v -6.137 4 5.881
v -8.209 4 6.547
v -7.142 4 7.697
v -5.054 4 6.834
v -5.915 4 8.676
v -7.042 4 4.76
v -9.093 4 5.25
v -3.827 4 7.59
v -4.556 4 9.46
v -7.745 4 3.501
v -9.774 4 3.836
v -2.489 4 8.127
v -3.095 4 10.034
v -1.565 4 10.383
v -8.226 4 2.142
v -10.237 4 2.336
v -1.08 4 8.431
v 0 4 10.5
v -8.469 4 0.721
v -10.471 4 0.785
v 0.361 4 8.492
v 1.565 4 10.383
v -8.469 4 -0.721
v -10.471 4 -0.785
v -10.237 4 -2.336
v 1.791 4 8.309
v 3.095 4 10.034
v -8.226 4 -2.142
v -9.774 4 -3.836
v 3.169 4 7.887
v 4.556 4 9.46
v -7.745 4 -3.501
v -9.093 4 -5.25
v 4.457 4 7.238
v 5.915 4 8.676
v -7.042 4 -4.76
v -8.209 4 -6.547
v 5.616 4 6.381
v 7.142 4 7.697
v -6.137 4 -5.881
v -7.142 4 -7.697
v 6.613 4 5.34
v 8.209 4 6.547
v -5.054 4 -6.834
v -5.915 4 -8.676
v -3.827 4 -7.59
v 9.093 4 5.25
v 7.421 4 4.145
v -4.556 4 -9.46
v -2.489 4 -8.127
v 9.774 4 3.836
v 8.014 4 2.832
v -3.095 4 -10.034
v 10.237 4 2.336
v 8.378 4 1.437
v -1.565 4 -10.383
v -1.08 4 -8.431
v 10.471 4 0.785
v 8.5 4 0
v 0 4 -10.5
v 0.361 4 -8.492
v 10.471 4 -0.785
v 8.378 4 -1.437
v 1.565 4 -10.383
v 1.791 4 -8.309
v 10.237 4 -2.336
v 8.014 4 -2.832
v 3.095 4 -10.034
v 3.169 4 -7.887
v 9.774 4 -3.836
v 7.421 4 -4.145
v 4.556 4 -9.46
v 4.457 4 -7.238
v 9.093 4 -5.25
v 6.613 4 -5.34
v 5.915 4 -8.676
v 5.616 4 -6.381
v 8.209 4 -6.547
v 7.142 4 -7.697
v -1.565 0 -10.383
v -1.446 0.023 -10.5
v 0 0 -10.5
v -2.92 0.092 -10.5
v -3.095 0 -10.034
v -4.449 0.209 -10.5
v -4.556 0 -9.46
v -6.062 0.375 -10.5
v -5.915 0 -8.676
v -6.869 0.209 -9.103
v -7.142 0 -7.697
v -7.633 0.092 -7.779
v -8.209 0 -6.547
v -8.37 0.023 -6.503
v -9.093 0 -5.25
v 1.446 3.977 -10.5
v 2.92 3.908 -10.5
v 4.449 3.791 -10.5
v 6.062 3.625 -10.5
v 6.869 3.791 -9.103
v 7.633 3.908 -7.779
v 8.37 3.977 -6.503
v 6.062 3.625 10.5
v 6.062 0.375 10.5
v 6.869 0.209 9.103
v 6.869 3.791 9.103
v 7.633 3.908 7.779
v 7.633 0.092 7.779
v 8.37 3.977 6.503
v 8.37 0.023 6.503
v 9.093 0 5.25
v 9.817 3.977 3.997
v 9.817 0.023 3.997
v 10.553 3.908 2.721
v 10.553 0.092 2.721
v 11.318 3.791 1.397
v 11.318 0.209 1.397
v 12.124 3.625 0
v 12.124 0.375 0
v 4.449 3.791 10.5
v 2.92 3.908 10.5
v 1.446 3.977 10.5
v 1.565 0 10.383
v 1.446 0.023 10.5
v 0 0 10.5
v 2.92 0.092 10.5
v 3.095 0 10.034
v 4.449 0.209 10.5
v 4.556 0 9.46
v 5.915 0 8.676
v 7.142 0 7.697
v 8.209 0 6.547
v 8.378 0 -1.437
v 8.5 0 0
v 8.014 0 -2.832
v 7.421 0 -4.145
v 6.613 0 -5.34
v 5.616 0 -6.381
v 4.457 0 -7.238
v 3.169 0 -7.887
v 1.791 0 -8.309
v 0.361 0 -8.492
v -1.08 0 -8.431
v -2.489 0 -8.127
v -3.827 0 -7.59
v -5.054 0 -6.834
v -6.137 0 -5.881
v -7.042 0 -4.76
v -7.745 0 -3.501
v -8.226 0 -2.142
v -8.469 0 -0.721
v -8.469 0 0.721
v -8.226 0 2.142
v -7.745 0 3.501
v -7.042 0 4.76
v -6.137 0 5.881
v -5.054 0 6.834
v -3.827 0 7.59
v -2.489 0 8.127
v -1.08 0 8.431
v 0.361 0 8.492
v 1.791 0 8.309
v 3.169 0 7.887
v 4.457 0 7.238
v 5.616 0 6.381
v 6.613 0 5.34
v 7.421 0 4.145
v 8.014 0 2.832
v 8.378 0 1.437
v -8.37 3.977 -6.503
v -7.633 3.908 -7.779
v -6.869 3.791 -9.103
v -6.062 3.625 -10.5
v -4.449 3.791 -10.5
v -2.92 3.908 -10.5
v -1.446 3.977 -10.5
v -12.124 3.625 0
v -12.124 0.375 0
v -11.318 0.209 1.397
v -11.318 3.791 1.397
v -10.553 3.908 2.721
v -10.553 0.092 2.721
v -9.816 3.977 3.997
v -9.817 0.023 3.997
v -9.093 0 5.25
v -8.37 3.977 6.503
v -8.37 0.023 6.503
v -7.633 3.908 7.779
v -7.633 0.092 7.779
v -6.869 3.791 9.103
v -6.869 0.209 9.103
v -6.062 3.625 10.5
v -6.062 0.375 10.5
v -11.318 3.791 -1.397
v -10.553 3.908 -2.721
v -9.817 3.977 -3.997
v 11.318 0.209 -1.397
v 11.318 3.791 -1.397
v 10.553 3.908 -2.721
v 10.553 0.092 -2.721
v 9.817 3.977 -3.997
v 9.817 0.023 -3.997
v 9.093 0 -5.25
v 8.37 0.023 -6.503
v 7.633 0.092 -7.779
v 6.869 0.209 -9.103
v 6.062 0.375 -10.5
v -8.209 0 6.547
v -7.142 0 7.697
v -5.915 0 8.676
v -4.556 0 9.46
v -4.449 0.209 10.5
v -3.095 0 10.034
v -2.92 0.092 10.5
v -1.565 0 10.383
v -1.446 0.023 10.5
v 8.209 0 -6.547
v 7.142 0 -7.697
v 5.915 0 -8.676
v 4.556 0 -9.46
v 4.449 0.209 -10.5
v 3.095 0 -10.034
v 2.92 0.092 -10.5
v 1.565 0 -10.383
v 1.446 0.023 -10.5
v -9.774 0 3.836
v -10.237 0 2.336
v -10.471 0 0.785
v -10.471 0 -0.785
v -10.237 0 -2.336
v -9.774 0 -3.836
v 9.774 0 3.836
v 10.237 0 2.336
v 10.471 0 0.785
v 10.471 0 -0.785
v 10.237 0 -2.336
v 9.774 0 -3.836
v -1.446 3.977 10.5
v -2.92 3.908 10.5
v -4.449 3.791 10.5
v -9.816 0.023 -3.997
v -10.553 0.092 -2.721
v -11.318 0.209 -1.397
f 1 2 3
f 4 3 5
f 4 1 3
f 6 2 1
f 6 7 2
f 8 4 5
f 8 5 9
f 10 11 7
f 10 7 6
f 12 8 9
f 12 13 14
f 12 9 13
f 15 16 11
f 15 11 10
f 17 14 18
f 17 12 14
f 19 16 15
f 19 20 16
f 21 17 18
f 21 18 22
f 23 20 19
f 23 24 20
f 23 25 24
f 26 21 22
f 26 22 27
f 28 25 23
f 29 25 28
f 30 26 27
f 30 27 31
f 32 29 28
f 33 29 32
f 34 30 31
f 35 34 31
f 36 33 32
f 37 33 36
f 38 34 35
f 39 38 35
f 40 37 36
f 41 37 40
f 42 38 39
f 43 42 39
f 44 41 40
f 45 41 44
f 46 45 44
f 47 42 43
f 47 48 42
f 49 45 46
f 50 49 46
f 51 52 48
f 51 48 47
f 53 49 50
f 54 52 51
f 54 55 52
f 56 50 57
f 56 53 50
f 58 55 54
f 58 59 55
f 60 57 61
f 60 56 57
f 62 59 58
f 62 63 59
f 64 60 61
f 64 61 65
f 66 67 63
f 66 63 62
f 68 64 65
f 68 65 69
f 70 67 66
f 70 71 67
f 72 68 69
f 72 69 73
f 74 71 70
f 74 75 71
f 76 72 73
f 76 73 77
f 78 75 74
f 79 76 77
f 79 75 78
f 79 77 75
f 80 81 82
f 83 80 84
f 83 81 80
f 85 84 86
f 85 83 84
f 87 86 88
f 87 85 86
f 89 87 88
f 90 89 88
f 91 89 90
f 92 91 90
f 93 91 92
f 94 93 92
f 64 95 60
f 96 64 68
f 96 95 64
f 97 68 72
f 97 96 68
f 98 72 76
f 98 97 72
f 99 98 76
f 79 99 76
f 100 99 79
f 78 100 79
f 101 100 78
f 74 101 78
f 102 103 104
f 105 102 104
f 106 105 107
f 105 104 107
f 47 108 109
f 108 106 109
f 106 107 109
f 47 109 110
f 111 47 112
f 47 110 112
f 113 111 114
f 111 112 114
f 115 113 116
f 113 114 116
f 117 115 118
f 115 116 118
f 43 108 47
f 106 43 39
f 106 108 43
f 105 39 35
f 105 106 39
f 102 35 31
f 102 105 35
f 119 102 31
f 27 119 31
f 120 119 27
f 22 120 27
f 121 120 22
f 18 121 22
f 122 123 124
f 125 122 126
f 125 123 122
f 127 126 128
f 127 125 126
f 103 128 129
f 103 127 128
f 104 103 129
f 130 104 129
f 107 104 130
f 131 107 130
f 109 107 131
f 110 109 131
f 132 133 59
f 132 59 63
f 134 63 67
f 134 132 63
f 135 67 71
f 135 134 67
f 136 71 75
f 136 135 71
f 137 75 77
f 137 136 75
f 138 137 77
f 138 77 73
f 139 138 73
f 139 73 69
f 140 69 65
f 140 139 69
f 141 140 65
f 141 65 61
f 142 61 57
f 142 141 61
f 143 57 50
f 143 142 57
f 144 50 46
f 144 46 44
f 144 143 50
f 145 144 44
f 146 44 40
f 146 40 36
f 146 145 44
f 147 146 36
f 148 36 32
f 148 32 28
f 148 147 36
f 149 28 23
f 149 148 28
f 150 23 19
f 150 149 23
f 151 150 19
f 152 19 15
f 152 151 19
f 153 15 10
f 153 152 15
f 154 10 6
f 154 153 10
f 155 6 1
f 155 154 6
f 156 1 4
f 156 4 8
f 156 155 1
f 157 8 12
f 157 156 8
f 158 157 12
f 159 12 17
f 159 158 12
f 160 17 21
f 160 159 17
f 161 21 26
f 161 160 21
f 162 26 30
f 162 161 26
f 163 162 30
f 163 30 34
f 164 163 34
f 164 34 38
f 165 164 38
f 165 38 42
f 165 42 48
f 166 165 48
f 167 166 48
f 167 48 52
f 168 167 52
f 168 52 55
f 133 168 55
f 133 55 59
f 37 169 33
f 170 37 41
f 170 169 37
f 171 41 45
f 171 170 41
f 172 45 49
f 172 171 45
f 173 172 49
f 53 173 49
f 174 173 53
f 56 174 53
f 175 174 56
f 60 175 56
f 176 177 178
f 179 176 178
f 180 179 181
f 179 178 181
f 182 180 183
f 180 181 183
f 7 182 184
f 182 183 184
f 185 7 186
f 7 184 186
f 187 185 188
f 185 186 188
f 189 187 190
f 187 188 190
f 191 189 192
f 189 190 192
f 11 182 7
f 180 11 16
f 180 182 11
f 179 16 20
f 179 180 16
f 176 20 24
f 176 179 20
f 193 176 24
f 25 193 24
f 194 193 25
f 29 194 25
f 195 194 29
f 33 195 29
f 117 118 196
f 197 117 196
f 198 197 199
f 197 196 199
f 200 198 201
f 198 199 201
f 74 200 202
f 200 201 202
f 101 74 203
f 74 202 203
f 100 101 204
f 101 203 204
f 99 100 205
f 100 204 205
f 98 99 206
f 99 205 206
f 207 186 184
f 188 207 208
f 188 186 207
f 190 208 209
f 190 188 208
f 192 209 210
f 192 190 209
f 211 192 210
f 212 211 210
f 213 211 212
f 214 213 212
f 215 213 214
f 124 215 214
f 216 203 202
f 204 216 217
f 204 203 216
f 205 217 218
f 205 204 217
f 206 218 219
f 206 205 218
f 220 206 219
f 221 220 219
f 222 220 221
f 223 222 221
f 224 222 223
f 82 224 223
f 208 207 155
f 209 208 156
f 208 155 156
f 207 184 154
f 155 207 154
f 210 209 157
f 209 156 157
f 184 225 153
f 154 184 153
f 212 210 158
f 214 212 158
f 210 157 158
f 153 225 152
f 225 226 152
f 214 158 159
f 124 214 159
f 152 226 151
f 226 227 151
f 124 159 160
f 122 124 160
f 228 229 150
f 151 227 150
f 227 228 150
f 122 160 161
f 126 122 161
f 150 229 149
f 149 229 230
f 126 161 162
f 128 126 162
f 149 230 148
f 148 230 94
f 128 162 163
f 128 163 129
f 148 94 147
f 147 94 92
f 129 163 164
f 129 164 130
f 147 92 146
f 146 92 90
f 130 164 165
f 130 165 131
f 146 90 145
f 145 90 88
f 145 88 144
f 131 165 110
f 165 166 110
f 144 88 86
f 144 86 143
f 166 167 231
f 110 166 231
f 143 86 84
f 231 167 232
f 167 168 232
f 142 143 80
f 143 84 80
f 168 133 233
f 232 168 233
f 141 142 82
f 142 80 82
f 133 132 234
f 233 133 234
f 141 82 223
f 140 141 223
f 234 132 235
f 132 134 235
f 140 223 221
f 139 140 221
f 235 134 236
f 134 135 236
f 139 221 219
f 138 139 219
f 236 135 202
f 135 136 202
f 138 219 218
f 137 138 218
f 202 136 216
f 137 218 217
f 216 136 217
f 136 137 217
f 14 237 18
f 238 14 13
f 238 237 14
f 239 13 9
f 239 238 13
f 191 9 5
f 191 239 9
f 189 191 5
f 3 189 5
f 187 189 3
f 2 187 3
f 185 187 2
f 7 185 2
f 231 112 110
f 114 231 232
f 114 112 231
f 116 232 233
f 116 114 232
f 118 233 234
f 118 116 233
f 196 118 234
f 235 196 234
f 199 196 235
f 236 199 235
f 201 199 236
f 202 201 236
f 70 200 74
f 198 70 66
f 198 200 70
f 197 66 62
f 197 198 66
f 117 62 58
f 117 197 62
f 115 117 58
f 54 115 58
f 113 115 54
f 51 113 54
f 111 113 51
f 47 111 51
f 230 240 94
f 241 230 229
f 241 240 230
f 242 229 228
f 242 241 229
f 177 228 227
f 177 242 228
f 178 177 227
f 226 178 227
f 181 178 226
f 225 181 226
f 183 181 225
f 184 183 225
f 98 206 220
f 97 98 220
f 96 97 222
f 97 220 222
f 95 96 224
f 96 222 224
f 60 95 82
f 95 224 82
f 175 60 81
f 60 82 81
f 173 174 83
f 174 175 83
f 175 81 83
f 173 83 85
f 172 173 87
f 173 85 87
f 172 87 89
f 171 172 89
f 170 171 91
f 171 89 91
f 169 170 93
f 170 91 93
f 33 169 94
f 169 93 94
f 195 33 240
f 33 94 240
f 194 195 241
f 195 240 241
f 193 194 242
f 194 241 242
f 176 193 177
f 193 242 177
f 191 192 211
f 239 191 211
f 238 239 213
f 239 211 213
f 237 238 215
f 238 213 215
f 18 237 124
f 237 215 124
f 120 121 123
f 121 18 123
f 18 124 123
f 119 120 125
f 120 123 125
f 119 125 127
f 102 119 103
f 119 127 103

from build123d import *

# Parameters (mm, degrees)
SKETCH_1_R          = 8.5
EXTRUDE_1_DEPTH     = 4
SKETCH_2_OUTSIDE_W  = 76.028
SKETCH_2_OUTSIDE_H  = 72.78
SKETCH_2_OUTSIDE_R  = 10.5
CUT_EXTRUDE_1_DEPTH = 5
CUT_EXTRUDE_1_TAPER = 77
SKETCH_3_OUTSIDE_W  = 76.028
SKETCH_3_OUTSIDE_H  = 72.78
SKETCH_3_OUTSIDE_R  = 10.5
CUT_EXTRUDE_2_DEPTH = 5
CUT_EXTRUDE_2_TAPER = 77


with BuildPart() as part:
    # Эскиз1 → Бобышка-Вытянуть1 (new body)
    with BuildSketch(Plane(origin=(0, 0, 0), x_dir=(1, 0, 0), z_dir=(0, 1, 0))):
        Polygon((12.124355653, 0), (6.062177826, 10.5), (-6.062177826, 10.5), (-12.124355653, 0), (-6.062177826, -10.5), (6.062177826, -10.5), align=None)
        Circle(SKETCH_1_R, mode=Mode.SUBTRACT)
    extrude(amount=EXTRUDE_1_DEPTH)

    # Эскиз2 outside → Вырез-Вытянуть1 (cut, through all)
    with BuildSketch(Plane(origin=(0, 4, 0), x_dir=(1, 0, 0), z_dir=(0, 1, 0))):
        Rectangle(SKETCH_2_OUTSIDE_W, SKETCH_2_OUTSIDE_H)
        Circle(SKETCH_2_OUTSIDE_R, mode=Mode.SUBTRACT)
    extrude(amount=-CUT_EXTRUDE_1_DEPTH, taper=CUT_EXTRUDE_1_TAPER, mode=Mode.SUBTRACT)

    # Эскиз3 outside → Вырез-Вытянуть2 (cut, through all)
    with BuildSketch(Plane.XZ):
        Rectangle(SKETCH_3_OUTSIDE_W, SKETCH_3_OUTSIDE_H)
        Circle(SKETCH_3_OUTSIDE_R, mode=Mode.SUBTRACT)
    extrude(amount=-CUT_EXTRUDE_2_DEPTH, taper=CUT_EXTRUDE_2_TAPER, mode=Mode.SUBTRACT)


solid = part.part
